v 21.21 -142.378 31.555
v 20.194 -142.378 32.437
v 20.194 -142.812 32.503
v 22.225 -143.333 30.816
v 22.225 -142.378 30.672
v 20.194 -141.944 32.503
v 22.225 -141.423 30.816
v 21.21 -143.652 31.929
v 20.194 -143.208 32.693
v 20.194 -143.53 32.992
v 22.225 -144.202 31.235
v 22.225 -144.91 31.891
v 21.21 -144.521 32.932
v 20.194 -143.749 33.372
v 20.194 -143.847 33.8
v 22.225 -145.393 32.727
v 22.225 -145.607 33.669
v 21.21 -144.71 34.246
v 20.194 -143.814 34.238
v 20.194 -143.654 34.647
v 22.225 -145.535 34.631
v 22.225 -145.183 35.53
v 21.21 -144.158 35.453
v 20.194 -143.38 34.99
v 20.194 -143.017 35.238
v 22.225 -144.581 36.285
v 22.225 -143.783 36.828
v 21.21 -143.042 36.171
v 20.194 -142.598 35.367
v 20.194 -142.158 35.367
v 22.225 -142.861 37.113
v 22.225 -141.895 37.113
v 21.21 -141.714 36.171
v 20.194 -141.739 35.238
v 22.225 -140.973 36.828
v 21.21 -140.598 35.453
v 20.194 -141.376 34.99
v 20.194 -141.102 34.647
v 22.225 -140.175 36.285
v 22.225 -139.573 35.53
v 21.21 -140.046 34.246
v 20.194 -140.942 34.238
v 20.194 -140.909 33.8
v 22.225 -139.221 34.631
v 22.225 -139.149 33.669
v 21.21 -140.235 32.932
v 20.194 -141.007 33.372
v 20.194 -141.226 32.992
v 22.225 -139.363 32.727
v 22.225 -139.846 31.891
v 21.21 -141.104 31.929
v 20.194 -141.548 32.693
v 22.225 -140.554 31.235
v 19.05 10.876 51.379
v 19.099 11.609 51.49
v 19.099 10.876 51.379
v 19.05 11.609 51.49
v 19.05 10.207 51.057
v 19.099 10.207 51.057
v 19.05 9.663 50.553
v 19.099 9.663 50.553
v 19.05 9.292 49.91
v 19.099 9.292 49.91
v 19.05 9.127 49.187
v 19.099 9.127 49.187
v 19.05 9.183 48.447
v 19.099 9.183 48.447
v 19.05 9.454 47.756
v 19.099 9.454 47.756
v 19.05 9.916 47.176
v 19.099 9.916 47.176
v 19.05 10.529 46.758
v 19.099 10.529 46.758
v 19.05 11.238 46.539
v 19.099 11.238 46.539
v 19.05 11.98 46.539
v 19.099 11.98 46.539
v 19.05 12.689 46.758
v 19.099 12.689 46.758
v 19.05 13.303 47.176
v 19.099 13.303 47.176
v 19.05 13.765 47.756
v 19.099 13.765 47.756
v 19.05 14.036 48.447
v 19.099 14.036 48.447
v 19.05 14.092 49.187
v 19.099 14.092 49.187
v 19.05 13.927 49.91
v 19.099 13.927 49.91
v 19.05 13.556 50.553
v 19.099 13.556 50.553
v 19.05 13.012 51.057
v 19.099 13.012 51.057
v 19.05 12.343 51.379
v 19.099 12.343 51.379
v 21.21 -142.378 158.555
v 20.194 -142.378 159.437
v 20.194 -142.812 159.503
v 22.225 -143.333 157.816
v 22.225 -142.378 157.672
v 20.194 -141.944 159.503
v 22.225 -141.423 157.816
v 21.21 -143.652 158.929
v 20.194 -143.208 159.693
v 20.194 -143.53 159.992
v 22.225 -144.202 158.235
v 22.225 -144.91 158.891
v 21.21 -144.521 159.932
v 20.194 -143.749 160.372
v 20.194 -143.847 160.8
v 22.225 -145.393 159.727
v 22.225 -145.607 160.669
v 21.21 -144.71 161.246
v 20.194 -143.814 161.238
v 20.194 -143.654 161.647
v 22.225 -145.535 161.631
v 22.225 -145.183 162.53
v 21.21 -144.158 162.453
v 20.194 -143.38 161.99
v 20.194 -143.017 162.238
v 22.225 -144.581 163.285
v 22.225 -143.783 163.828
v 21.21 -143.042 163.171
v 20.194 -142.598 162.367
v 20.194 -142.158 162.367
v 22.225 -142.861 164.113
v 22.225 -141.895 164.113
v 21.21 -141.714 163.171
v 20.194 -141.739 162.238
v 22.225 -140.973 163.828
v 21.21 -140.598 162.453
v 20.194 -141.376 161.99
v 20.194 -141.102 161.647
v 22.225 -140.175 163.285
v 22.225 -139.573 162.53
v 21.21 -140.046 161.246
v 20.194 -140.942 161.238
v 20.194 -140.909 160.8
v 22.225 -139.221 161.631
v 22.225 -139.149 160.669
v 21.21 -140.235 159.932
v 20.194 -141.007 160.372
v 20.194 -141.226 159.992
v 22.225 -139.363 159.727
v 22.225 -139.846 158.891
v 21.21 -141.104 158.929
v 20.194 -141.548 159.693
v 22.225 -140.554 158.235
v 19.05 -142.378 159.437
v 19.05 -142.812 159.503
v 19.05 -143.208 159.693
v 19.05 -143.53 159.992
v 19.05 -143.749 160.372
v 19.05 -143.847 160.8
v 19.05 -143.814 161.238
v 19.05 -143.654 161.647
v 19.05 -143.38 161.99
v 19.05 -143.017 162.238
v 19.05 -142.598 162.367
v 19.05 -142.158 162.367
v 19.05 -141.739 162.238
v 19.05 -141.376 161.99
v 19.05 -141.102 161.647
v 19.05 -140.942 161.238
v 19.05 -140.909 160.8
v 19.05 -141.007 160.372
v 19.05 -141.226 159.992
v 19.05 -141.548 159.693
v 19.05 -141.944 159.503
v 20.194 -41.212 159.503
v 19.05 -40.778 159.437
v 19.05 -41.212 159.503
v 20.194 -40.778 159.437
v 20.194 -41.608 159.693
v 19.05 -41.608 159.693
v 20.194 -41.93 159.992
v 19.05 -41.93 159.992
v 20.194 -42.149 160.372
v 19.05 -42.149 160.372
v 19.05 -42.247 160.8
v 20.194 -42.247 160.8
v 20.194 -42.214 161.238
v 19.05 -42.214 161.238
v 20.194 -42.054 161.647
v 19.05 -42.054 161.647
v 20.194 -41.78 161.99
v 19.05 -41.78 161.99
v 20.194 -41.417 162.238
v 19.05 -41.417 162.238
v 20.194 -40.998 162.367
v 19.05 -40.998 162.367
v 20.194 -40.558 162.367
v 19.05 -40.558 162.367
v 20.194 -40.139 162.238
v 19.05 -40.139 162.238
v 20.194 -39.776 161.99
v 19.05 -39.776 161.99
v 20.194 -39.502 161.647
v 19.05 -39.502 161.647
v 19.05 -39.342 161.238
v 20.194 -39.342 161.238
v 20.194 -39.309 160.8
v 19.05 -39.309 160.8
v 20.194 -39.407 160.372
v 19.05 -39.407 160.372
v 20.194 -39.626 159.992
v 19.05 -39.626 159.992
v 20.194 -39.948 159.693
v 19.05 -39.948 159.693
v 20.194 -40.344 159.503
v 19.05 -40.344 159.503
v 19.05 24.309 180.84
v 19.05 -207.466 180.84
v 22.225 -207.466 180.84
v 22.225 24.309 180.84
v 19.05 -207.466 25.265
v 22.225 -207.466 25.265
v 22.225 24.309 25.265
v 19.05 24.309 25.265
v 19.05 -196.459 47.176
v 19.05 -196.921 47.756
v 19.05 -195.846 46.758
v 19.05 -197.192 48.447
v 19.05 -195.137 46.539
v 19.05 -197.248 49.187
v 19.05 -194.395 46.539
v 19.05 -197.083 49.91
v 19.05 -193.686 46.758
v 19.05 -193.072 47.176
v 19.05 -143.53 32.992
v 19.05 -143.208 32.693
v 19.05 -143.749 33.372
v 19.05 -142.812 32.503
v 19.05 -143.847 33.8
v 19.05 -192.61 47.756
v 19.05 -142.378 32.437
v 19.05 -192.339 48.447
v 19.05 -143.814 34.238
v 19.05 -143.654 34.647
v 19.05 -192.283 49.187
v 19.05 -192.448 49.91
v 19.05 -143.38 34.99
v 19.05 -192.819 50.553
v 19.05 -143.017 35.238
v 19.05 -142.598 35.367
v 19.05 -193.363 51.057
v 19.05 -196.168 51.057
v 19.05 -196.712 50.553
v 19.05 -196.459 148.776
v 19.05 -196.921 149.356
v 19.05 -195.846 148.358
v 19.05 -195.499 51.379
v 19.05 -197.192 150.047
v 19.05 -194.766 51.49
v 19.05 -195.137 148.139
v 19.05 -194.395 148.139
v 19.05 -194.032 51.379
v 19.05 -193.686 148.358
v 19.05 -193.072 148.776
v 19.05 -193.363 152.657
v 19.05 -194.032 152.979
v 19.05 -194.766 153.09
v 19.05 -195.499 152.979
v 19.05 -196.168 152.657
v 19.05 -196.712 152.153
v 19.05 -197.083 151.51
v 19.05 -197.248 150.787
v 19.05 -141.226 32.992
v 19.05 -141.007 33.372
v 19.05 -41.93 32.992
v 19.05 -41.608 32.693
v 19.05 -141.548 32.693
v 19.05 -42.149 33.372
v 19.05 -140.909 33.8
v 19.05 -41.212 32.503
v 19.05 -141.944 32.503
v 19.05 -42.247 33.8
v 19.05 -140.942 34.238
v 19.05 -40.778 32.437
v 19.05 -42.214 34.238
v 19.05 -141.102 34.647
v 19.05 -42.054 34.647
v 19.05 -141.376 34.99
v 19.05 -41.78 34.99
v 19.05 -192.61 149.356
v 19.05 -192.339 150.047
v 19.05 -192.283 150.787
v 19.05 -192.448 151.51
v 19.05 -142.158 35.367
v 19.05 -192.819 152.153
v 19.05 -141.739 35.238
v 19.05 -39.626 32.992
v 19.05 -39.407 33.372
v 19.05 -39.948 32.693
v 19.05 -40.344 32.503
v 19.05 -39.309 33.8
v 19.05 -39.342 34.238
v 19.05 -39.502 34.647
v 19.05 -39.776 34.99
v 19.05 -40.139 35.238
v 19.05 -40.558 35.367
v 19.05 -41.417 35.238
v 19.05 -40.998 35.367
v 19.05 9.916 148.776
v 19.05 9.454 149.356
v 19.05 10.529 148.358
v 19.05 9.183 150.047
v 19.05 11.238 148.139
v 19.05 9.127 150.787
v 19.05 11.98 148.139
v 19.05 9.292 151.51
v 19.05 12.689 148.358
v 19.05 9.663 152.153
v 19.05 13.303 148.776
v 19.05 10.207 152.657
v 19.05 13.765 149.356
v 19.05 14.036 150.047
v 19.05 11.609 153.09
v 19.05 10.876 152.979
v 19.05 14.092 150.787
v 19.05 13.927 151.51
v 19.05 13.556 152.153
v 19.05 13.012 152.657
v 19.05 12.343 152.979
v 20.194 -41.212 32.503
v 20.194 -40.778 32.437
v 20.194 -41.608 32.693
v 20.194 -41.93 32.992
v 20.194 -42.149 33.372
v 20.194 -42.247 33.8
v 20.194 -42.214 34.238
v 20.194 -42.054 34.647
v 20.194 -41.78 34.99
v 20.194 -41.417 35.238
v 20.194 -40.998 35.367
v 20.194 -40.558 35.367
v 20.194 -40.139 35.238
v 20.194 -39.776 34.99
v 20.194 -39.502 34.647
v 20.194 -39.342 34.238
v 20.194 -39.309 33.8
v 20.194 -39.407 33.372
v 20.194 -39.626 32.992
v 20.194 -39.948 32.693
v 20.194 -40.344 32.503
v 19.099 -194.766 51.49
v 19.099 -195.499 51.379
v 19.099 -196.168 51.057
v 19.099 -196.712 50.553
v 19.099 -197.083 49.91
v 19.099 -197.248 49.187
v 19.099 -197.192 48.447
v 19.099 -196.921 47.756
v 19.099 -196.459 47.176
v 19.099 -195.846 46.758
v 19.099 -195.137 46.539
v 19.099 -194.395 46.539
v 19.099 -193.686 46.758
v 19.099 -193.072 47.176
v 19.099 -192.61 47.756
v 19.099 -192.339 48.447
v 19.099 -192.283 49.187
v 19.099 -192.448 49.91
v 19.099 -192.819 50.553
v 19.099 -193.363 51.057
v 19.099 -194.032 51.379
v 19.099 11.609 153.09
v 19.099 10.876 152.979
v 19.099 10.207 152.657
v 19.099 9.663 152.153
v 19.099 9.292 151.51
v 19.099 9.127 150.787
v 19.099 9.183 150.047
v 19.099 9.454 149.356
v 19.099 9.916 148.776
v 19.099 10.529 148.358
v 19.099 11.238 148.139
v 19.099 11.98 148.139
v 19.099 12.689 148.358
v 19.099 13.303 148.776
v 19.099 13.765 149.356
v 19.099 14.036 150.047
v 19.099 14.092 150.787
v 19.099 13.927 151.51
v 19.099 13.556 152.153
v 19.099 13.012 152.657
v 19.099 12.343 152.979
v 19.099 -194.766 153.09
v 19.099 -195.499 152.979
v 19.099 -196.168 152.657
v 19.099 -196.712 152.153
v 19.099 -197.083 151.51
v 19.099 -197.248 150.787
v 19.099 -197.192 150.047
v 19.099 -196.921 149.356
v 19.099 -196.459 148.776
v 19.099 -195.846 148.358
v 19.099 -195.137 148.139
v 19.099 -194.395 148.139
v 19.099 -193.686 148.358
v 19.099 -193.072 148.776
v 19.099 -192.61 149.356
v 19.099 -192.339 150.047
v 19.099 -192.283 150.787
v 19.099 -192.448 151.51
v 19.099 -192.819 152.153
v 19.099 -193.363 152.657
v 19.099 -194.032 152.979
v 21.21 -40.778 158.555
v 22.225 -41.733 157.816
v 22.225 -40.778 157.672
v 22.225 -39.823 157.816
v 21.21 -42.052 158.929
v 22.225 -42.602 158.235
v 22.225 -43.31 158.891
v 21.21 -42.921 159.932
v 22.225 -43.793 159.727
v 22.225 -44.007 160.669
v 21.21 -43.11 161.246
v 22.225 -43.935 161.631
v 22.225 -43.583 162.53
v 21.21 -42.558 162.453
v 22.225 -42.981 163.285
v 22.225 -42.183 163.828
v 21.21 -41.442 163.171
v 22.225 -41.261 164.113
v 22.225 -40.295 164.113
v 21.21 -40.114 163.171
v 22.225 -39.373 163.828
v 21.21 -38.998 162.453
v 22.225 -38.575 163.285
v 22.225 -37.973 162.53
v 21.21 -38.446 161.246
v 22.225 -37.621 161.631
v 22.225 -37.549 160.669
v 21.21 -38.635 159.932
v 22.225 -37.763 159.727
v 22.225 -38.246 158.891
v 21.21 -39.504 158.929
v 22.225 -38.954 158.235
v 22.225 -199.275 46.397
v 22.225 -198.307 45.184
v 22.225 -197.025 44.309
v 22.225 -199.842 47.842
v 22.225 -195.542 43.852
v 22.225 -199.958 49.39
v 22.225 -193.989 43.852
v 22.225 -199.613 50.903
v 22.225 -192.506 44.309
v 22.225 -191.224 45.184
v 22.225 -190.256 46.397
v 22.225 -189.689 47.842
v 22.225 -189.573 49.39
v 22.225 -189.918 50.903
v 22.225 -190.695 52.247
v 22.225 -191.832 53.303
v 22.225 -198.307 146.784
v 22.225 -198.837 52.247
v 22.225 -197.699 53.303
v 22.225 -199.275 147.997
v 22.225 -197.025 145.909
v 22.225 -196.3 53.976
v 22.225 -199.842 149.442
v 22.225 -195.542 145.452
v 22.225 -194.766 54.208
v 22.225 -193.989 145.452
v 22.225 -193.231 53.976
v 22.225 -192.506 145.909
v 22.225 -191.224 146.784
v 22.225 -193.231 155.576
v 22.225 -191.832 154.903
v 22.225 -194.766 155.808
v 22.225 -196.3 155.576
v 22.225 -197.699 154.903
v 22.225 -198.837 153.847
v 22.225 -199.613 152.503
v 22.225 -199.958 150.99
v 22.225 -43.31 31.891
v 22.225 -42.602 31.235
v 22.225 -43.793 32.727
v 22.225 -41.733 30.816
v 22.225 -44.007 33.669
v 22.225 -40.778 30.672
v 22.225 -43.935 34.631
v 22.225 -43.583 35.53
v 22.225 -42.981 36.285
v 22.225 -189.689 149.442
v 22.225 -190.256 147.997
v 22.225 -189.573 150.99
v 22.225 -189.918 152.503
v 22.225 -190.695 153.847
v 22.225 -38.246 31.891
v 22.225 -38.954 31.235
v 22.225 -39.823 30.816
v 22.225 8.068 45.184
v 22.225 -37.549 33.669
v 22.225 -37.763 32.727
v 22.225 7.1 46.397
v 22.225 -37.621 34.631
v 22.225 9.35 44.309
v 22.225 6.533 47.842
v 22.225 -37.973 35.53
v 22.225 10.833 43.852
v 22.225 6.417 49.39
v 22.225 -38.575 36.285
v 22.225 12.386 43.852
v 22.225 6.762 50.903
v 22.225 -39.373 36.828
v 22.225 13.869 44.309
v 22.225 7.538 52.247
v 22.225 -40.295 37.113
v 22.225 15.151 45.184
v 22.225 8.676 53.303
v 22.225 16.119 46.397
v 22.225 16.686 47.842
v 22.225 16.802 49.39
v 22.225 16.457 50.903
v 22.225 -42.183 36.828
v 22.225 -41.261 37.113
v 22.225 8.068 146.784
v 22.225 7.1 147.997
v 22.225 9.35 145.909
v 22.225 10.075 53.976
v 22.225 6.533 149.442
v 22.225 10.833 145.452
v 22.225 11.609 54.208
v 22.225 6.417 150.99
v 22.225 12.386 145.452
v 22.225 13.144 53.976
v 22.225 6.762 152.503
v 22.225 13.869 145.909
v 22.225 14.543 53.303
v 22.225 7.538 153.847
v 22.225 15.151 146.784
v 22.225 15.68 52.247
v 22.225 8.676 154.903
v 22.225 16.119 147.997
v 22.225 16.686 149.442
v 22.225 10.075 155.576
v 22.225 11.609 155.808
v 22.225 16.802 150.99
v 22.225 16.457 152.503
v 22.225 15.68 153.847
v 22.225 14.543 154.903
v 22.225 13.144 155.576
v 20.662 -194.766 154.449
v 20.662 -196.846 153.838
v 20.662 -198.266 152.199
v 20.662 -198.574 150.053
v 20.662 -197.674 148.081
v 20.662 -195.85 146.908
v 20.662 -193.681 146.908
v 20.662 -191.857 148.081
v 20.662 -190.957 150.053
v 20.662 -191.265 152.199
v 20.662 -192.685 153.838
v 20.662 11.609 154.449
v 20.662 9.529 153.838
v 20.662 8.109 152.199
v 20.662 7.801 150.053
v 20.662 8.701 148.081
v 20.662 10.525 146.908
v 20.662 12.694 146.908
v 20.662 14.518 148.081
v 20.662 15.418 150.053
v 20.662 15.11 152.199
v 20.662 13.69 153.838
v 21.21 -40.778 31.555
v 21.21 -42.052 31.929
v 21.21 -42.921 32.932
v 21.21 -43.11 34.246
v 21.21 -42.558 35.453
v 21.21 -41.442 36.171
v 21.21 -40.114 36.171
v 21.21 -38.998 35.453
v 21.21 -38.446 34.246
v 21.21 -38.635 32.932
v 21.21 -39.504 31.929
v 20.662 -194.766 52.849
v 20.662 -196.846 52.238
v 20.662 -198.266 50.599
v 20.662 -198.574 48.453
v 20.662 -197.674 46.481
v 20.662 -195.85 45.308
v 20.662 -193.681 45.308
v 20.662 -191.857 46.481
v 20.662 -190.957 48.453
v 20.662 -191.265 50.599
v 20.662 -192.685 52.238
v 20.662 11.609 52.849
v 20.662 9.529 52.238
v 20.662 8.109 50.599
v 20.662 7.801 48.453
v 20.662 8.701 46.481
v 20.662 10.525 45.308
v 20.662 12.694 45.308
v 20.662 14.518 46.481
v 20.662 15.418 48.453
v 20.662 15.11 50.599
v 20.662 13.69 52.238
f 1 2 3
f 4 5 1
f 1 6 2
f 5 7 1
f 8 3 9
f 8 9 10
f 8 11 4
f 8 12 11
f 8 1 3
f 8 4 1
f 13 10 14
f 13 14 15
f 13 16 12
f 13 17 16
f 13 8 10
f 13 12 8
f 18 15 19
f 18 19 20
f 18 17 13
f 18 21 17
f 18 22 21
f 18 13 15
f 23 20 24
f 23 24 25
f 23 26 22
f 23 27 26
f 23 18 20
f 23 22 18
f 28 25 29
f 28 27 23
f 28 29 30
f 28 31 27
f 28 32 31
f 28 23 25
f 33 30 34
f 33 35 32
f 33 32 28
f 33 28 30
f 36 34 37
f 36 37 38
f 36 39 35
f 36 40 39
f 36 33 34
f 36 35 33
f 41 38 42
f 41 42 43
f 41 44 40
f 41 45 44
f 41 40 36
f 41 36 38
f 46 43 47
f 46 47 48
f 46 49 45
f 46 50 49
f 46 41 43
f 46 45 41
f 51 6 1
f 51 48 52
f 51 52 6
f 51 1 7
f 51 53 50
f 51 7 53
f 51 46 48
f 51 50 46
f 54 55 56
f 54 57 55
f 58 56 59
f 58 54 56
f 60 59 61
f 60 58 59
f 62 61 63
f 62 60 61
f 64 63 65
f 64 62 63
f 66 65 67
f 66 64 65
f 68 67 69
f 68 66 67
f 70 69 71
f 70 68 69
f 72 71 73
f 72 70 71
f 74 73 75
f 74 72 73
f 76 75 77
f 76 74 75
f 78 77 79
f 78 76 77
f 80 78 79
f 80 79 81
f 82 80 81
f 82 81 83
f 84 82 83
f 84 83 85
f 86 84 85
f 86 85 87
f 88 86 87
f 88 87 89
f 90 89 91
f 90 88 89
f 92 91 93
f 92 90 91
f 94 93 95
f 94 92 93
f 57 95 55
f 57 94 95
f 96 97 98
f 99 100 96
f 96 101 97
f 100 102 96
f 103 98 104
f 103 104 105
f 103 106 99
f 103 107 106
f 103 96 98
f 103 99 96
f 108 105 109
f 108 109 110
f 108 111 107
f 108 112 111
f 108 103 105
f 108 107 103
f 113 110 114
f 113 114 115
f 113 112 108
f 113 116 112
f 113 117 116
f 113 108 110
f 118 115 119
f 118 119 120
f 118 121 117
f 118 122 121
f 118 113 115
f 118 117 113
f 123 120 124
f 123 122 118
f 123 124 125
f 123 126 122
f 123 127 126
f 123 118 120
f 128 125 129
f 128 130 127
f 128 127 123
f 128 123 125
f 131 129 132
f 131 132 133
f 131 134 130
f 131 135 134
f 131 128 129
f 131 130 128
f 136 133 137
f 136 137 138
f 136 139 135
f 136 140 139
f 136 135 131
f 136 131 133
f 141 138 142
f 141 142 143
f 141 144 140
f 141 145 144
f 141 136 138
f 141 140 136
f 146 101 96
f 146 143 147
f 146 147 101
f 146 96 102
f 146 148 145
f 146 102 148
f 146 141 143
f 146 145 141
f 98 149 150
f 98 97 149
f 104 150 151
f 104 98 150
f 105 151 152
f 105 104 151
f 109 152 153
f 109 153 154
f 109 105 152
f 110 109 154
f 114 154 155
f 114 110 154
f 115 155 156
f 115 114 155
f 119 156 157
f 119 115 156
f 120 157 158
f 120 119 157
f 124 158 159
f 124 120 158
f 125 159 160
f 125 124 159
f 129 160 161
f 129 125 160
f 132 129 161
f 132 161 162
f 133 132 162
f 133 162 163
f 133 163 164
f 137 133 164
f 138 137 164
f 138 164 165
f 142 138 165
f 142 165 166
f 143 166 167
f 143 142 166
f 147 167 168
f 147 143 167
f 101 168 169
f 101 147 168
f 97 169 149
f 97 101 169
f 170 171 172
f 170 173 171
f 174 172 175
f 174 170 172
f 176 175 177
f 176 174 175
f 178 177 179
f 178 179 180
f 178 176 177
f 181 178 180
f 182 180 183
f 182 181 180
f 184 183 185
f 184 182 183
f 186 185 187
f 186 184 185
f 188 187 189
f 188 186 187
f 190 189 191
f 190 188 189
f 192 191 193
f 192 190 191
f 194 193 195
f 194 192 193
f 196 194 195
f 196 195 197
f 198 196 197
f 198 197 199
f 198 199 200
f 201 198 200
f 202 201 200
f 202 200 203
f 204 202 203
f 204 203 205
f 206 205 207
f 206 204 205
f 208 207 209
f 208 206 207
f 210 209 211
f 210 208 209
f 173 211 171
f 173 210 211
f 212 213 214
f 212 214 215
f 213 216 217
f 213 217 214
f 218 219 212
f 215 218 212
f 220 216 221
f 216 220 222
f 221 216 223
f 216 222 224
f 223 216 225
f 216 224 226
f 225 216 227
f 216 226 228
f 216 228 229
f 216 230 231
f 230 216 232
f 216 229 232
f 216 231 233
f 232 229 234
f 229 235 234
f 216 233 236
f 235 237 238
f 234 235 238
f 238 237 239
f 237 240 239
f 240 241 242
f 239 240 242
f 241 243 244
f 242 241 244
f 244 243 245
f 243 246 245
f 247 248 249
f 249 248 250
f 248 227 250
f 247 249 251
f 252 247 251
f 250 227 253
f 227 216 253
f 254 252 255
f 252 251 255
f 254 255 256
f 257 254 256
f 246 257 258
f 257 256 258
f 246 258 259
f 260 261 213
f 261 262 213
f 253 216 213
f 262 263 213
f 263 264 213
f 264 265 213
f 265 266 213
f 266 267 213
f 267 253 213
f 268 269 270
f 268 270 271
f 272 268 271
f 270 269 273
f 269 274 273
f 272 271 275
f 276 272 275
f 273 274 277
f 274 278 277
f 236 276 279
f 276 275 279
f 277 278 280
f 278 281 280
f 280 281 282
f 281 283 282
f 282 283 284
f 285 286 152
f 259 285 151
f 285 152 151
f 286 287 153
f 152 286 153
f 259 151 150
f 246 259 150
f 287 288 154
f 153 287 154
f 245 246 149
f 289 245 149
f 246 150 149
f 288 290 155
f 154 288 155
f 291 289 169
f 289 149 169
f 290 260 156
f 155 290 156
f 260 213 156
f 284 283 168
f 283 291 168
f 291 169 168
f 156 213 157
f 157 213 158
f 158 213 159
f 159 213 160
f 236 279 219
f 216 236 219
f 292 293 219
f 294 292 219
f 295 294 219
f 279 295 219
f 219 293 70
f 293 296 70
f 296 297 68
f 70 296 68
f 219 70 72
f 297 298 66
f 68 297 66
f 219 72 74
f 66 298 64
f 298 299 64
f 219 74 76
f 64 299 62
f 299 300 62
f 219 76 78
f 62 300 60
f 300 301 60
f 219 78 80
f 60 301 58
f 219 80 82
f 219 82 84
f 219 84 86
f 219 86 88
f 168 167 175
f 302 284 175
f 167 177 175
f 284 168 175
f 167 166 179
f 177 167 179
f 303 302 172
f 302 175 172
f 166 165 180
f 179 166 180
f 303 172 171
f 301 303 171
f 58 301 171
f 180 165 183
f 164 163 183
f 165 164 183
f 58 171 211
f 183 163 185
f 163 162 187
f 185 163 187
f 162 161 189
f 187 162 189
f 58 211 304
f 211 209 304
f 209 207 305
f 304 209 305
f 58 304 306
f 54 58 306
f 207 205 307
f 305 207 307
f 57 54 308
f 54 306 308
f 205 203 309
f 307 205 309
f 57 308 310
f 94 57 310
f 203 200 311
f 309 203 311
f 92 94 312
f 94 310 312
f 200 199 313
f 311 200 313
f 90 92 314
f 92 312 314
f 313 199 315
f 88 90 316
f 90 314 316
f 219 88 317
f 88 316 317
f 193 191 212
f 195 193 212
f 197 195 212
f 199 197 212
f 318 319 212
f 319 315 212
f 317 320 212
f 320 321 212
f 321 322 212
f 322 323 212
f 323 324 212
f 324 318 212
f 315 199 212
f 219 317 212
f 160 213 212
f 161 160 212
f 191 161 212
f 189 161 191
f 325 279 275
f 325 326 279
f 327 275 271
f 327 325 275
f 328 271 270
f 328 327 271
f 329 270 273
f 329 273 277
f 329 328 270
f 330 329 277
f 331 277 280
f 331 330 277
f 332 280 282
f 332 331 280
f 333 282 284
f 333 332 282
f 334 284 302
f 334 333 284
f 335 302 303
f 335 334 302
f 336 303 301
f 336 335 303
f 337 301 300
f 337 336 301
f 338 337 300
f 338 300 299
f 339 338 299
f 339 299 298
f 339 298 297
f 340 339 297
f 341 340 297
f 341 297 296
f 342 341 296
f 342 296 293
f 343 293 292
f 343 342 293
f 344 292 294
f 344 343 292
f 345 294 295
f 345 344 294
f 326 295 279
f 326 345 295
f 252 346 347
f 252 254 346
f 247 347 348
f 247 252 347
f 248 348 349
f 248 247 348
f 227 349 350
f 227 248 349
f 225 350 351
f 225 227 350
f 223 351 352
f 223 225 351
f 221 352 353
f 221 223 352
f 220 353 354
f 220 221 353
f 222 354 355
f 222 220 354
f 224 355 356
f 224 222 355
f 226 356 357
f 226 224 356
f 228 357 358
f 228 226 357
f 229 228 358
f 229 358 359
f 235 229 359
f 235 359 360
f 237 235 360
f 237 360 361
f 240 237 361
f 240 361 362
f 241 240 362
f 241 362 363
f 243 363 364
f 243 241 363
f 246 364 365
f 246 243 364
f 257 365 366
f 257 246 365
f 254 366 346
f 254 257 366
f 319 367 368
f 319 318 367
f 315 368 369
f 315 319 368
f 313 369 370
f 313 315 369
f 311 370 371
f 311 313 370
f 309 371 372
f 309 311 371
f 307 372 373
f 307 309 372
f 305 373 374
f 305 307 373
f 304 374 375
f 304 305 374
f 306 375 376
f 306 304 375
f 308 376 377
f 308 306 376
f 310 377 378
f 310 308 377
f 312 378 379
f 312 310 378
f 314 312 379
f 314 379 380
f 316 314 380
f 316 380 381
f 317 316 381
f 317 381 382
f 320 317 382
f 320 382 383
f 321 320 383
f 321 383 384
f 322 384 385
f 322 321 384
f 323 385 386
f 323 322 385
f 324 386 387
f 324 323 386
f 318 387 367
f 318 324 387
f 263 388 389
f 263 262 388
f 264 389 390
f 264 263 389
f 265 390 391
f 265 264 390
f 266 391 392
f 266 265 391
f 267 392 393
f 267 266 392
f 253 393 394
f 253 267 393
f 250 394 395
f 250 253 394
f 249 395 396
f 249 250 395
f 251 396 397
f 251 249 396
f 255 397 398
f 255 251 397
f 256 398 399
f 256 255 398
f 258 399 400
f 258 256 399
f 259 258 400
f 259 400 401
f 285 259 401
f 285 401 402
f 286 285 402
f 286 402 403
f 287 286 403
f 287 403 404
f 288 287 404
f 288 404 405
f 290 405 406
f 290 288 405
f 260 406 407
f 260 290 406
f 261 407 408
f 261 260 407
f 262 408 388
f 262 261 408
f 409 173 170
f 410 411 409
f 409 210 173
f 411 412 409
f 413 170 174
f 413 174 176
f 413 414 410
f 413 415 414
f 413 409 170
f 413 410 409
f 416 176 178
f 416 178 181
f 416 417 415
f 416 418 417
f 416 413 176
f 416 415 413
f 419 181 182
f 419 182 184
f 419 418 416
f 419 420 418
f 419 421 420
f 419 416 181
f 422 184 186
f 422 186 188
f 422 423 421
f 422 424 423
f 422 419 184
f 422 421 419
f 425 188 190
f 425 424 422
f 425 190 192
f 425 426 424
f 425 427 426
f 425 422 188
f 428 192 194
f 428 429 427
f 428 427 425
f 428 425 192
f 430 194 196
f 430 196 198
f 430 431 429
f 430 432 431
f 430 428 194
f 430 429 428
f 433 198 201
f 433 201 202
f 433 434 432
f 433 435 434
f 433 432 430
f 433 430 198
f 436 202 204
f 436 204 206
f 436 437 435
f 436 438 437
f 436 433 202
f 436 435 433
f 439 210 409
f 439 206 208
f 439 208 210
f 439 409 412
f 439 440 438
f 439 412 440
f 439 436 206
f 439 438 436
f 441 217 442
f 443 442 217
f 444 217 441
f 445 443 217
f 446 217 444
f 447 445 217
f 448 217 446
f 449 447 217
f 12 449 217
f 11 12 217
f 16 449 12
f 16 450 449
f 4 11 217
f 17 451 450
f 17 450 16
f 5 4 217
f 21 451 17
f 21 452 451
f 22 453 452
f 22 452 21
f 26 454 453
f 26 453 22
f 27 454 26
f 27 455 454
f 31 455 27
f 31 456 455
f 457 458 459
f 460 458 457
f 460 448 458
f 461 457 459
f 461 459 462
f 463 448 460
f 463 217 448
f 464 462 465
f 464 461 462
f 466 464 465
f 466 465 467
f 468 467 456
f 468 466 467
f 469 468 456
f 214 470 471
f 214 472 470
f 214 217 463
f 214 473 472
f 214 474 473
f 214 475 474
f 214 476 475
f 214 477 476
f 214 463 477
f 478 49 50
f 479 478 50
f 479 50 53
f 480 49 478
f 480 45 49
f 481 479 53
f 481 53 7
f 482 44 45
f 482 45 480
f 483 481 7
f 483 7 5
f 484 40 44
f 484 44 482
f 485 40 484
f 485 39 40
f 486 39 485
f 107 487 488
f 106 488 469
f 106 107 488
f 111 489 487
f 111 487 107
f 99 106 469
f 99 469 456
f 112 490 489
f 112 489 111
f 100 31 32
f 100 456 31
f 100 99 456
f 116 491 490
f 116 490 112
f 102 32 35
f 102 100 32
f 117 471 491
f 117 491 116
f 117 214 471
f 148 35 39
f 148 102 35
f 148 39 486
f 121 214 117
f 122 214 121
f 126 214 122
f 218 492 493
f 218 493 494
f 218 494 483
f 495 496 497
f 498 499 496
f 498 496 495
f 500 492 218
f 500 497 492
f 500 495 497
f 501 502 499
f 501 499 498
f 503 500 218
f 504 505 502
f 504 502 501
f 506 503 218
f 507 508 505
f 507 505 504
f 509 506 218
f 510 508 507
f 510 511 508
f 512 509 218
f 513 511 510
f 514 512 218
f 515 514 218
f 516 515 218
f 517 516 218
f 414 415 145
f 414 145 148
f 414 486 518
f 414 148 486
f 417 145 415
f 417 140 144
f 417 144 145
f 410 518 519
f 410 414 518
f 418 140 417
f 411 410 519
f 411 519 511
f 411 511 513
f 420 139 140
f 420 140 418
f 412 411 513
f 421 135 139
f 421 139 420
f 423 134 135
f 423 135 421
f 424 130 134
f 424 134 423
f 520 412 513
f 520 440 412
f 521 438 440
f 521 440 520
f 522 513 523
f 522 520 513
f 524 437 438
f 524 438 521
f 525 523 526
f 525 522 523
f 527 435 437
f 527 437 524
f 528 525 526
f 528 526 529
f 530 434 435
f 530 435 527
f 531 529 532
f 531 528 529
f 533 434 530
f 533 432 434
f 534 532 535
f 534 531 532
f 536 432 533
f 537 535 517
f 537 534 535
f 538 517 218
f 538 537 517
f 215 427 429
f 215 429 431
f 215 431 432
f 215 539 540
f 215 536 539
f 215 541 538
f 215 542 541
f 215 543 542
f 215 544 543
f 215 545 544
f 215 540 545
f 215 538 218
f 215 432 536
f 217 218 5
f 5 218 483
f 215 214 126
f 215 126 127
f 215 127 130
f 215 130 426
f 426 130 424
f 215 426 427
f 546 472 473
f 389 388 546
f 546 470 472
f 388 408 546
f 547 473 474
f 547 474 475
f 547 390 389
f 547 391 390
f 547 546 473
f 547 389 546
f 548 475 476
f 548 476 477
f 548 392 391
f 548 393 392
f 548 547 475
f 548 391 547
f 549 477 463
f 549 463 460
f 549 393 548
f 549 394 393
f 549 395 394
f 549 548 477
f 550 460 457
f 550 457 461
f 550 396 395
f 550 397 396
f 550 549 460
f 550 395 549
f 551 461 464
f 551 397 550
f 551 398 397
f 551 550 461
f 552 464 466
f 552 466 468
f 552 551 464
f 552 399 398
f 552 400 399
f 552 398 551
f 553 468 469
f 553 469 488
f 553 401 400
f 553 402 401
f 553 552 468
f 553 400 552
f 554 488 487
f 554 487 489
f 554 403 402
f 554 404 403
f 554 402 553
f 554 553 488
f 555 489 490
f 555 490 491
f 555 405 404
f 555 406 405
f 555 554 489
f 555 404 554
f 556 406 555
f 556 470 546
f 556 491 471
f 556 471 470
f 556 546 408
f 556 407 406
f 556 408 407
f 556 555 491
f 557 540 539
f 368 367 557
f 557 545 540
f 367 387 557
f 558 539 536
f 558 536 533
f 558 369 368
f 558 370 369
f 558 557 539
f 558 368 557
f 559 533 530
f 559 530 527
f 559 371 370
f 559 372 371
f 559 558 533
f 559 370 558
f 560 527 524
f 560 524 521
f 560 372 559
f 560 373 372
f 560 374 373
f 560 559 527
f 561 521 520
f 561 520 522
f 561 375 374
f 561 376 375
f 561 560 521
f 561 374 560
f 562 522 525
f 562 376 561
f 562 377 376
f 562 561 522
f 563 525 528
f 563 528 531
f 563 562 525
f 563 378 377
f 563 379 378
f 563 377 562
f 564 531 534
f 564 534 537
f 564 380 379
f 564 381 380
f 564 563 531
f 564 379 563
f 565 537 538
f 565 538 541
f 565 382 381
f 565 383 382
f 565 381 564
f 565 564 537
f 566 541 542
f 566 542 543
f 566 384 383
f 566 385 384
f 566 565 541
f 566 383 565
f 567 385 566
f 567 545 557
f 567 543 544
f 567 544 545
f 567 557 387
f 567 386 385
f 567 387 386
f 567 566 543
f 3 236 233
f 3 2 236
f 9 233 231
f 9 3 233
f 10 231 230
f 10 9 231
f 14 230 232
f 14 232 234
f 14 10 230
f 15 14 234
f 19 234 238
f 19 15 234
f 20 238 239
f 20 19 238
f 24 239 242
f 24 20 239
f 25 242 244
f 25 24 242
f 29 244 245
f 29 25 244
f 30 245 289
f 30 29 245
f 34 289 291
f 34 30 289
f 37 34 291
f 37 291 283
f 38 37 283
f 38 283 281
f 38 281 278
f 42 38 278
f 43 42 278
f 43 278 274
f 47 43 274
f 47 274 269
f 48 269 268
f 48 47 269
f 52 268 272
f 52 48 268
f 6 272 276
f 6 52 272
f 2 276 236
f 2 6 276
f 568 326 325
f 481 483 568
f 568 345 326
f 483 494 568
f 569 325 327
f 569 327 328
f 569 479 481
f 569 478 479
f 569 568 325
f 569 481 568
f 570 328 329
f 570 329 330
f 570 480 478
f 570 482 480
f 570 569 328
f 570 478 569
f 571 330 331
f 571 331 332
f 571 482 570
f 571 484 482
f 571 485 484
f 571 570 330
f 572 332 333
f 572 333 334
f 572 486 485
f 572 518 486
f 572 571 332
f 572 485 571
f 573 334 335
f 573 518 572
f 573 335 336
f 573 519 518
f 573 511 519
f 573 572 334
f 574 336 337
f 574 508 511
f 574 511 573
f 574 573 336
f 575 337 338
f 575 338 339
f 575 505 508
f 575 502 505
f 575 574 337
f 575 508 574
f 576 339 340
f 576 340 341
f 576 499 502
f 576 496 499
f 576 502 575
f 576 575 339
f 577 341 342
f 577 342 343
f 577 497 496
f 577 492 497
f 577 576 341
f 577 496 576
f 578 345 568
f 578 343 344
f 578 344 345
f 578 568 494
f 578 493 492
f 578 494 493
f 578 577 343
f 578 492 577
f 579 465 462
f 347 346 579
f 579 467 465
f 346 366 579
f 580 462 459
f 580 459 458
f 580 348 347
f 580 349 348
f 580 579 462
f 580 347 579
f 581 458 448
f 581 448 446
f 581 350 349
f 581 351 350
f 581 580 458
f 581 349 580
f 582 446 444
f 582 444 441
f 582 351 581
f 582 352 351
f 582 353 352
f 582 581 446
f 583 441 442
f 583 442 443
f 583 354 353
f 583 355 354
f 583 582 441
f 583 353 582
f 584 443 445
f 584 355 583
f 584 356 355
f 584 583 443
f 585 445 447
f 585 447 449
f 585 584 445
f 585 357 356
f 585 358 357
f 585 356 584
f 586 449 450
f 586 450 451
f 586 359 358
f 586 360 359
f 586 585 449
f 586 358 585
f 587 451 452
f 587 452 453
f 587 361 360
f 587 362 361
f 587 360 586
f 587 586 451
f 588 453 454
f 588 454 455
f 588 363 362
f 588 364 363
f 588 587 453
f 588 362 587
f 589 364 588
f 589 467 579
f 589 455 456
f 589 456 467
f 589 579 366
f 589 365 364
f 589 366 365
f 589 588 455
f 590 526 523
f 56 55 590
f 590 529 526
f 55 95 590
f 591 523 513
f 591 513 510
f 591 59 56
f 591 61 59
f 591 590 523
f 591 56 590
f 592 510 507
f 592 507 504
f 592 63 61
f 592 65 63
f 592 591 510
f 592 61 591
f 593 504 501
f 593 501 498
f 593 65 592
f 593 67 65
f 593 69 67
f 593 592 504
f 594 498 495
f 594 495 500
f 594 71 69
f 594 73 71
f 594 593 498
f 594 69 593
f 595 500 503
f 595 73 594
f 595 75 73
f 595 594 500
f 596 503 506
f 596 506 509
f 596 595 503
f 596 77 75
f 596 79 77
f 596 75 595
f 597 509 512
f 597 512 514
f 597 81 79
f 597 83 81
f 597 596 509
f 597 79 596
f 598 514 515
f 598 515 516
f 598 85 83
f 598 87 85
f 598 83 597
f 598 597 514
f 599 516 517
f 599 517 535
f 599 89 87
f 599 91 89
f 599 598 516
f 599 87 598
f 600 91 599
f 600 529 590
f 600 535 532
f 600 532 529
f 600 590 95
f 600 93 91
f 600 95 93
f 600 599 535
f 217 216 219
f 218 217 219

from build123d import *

# Parameters (mm, degrees)
SKETCH1_W                       = 231.775000504
SKETCH1_H                       = 155.575
BOSS_EXTRUDE1_DEPTH             = 3.175
F_10_CLEARANCE_HOLE1_AT_2_COUNT = 2
F_10_CLEARANCE_HOLE1_AT_2_PITCH = 101.6
F_10_CLEARANCE_HOLE1_AT_3_COUNT = 2
F_10_CLEARANCE_HOLE1_AT_3_PITCH = 230.028695701
F_10_CLEARANCE_HOLE1_AT_4_COUNT = 2
F_10_CLEARANCE_HOLE1_AT_4_PITCH = 206.375000535
F_4_CLEARANCE_HOLE1_AT_2_COUNT  = 2
F_4_CLEARANCE_HOLE1_AT_2_PITCH  = 101.6
F_4_CLEARANCE_HOLE1_AT_3_COUNT  = 2
F_4_CLEARANCE_HOLE1_AT_3_PITCH  = 162.639355631
F_4_CLEARANCE_HOLE1_AT_4_COUNT  = 2
F_4_CLEARANCE_HOLE1_AT_4_PITCH  = 127


with BuildPart() as part:
    # Sketch1 → Boss-Extrude1 (new body)
    with BuildSketch(Plane.YZ.offset(19.05)):
        with Locations((-91.578028487, 103.052517839)):
            Rectangle(SKETCH1_W, SKETCH1_H)
    extrude(amount=BOSS_EXTRUDE1_DEPTH)

    # Sketch5 → #10 Clearance Hole1 (revolve, cut)
    with BuildSketch(Plane(origin=(19.05, -194.76552877, 150.600645729), x_dir=(0, 0, 1), z_dir=(0, 1, 0))):
        Polygon((0, 0), (0, 3.175), (5.207, 3.175), (2.4892, 0.048528743), (2.4892, 0), align=None)
    f_10_clearance_hole1 = revolve(axis=Axis((12.7, -194.76552877, 150.600645729), (1, 0, 0)), mode=Mode.SUBTRACT)

    # #10 Clearance Hole1 at 2: #10 Clearance Hole1 ×2
    with Locations(*[(0, 0, -i * F_10_CLEARANCE_HOLE1_AT_2_PITCH) for i in range(1, F_10_CLEARANCE_HOLE1_AT_2_COUNT)]):
        add(f_10_clearance_hole1, mode=Mode.SUBTRACT)

    # #10 Clearance Hole1 at 3: #10 Clearance Hole1 ×2
    with Locations(*[Vector(0, 0.8971706764945216, -0.44168402420549757) * (i * F_10_CLEARANCE_HOLE1_AT_3_PITCH) for i in range(1, F_10_CLEARANCE_HOLE1_AT_3_COUNT)]):
        add(f_10_clearance_hole1, mode=Mode.SUBTRACT)

    # #10 Clearance Hole1 at 4: #10 Clearance Hole1 ×2
    with Locations(*[(0, i * F_10_CLEARANCE_HOLE1_AT_4_PITCH, 0) for i in range(1, F_10_CLEARANCE_HOLE1_AT_4_COUNT)]):
        add(f_10_clearance_hole1, mode=Mode.SUBTRACT)

    # Sketch11 → #4 Clearance Hole1 (revolve, cut)
    with BuildSketch(Plane(origin=(22.225, -40.778028487, 160.910543982), x_dir=(0, 0, -1), z_dir=(0, 1, 0))):
        Polygon((0, 0), (0, 3.175), (1.4732, 3.175), (1.4732, 2.030745349), (3.2385, 0), align=None)
    f_4_clearance_hole1 = revolve(axis=Axis((28.575, -40.778028487, 160.910543982), (-1, 0, 0)), mode=Mode.SUBTRACT)

    # #4 Clearance Hole1 at 2: #4 Clearance Hole1 ×2
    with Locations(*[(0, -i * F_4_CLEARANCE_HOLE1_AT_2_PITCH, 0) for i in range(1, F_4_CLEARANCE_HOLE1_AT_2_COUNT)]):
        add(f_4_clearance_hole1, mode=Mode.SUBTRACT)

    # #4 Clearance Hole1 at 3: #4 Clearance Hole1 ×2
    with Locations(*[Vector(0, -0.6246950475544236, -0.7808688094430308) * (i * F_4_CLEARANCE_HOLE1_AT_3_PITCH) for i in range(1, F_4_CLEARANCE_HOLE1_AT_3_COUNT)]):
        add(f_4_clearance_hole1, mode=Mode.SUBTRACT)

    # #4 Clearance Hole1 at 4: #4 Clearance Hole1 ×2
    with Locations(*[(0, 0, -i * F_4_CLEARANCE_HOLE1_AT_4_PITCH) for i in range(1, F_4_CLEARANCE_HOLE1_AT_4_COUNT)]):
        add(f_4_clearance_hole1, mode=Mode.SUBTRACT)


solid = part.part
